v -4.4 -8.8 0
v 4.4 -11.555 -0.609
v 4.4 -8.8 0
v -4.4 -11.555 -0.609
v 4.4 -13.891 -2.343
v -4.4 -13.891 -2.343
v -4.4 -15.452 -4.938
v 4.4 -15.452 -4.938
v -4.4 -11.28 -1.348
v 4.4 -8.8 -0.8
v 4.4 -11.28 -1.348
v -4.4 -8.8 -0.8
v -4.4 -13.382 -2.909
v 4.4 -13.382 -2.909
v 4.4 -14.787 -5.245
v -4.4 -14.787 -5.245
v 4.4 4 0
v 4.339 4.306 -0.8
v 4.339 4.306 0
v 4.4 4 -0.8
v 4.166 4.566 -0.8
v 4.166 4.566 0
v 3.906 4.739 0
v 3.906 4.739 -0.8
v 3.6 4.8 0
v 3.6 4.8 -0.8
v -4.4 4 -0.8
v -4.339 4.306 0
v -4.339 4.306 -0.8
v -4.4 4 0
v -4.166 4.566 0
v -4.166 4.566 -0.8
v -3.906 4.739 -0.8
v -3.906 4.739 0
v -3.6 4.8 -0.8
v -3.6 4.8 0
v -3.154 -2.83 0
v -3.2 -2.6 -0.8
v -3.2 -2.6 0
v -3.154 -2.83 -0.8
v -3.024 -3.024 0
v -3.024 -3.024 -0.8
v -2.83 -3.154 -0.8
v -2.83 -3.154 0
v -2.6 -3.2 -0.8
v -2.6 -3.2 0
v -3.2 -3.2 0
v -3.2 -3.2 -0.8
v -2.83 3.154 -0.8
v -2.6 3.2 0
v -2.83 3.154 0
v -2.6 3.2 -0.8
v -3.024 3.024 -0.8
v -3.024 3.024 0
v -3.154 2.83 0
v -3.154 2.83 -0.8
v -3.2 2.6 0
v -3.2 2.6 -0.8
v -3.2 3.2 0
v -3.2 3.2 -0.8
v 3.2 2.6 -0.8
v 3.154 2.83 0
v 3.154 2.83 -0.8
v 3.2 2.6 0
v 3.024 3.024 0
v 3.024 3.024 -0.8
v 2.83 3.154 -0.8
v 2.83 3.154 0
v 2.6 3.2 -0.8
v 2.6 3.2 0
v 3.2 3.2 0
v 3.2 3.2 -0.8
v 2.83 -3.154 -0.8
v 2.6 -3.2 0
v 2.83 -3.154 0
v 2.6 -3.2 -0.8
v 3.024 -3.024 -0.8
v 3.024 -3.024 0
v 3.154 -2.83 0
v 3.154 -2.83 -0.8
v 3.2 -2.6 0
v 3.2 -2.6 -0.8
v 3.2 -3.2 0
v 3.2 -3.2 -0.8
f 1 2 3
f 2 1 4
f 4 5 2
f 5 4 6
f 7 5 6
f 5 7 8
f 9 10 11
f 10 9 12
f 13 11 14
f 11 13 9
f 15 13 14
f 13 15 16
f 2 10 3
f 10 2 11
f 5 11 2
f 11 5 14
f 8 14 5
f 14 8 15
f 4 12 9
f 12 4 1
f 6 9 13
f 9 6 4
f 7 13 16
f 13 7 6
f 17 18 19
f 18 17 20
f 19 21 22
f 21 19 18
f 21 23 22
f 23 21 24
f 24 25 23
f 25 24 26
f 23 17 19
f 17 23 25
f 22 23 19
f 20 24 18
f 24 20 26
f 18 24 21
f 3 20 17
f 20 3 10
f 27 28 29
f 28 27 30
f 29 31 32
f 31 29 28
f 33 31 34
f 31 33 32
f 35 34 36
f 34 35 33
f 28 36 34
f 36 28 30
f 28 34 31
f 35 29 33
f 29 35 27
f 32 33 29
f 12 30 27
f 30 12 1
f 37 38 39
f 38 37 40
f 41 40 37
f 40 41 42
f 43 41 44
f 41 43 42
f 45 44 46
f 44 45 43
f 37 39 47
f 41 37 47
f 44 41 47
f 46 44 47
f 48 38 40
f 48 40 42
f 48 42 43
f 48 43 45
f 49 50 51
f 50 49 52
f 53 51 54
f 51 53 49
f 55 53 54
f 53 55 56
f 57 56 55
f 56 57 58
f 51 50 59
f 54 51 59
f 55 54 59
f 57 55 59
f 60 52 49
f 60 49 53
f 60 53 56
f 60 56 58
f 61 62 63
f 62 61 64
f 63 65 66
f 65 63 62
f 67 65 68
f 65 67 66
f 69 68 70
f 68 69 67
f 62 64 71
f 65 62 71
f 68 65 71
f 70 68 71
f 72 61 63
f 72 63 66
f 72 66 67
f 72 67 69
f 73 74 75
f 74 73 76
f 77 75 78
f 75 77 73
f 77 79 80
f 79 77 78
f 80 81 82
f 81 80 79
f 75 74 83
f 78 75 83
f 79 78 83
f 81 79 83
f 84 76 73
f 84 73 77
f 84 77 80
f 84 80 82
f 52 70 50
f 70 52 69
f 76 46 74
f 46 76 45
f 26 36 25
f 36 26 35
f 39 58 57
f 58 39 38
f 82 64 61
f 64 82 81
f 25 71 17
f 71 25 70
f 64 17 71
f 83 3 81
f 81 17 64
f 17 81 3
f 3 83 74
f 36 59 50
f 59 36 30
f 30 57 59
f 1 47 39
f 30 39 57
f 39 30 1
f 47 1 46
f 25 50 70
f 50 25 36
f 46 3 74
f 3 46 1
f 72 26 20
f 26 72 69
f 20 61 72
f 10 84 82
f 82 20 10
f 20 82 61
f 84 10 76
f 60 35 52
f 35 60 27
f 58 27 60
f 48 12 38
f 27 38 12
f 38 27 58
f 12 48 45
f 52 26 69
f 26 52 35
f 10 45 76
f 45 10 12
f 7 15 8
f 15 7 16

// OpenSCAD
// file: ../p/4-4edge.scad
use <../lib.scad>
$fa=1; $fs=0.2;
function ldraw_lib__4_4edge(realsolid=false) = [
// 0 Circle 1.0
// 0 Name: 4-4edge.dat
// 0 Author: James Jessiman
// 0 !LDRAW_ORG Primitive UPDATE 2017-01
// 0 !LICENSE Licensed under CC BY 2.0 and CC BY 4.0 : see CAreadme.txt
// 
// 0 BFC CERTIFY CCW
  [0,"BFC","CERTIFY"],
  [0,"BFC","CCW"],
// 
// 0 !HISTORY 1998-12-15 [PTadmin] Official Update 1998-10
// 0 !HISTORY 2005-12-28 [PTadmin] Official Update 2005-01
// 0 !HISTORY 2007-06-24 [PTadmin] Header formatted for Contributor Agreement
// 0 !HISTORY 2008-07-01 [PTadmin] Official Update 2008-01
// 0 !HISTORY 2017-01-15 [Steffen] BFCed
// 0 !HISTORY 2017-12-30 [PTadmin] Official Update 2017-01
// 
// 
// 2 24 1 0 0 0.9239 0 0.3827
  [2,24,1,0,0,0.9239,0,0.3827],
// 2 24 0.9239 0 0.3827 0.7071 0 0.7071
  [2,24,0.9239,0,0.3827,0.7071,0,0.7071],
// 2 24 0.7071 0 0.7071 0.3827 0 0.9239
  [2,24,0.7071,0,0.7071,0.3827,0,0.9239],
// 2 24 0.3827 0 0.9239 0 0 1
  [2,24,0.3827,0,0.9239,0,0,1],
// 2 24 0 0 1 -0.3827 0 0.9239
  [2,24,0,0,1,-0.3827,0,0.9239],
// 2 24 -0.3827 0 0.9239 -0.7071 0 0.7071
  [2,24,-0.3827,0,0.9239,-0.7071,0,0.7071],
// 2 24 -0.7071 0 0.7071 -0.9239 0 0.3827
  [2,24,-0.7071,0,0.7071,-0.9239,0,0.3827],
// 2 24 -0.9239 0 0.3827 -1 0 -0
  [2,24,-0.9239,0,0.3827,-1,0,-0],
// 2 24 -1 0 -0 -0.9239 0 -0.3827
  [2,24,-1,0,-0,-0.9239,0,-0.3827],
// 2 24 -0.9239 0 -0.3827 -0.7071 0 -0.7071
  [2,24,-0.9239,0,-0.3827,-0.7071,0,-0.7071],
// 2 24 -0.7071 0 -0.7071 -0.3827 0 -0.9239
  [2,24,-0.7071,0,-0.7071,-0.3827,0,-0.9239],
// 2 24 -0.3827 0 -0.9239 0 0 -1
  [2,24,-0.3827,0,-0.9239,0,0,-1],
// 2 24 0 0 -1 0.3827 0 -0.9239
  [2,24,0,0,-1,0.3827,0,-0.9239],
// 2 24 0.3827 0 -0.9239 0.7071 0 -0.7071
  [2,24,0.3827,0,-0.9239,0.7071,0,-0.7071],
// 2 24 0.7071 0 -0.7071 0.9239 0 -0.3827
  [2,24,0.7071,0,-0.7071,0.9239,0,-0.3827],
// 2 24 0.9239 0 -0.3827 1 0 0
  [2,24,0.9239,0,-0.3827,1,0,0],
];
module ldraw_lib__4_4edge(step=0, col=false, unit=2/5, alt=false, line=0.2, solid=!$preview)
    makepoly(ldraw_lib__4_4edge(solid), step=step, col=col, unit=unit, alt=alt, line=line, solid=solid);
ldraw_lib__4_4edge(line=0.2);
// file: ../p/4-4disc.scad
use <../lib.scad>
$fa=1; $fs=0.2;
function ldraw_lib__4_4disc(realsolid=false) = [
// 0 Disc 1.0
// 0 Name: 4-4disc.dat
// 0 Author: James Jessiman
// 0 !LDRAW_ORG Primitive UPDATE 2002-02
// 0 !LICENSE Licensed under CC BY 2.0 and CC BY 4.0 : see CAreadme.txt
// 
// 0 BFC CERTIFY CCW
  [0,"BFC","CERTIFY"],
  [0,"BFC","CCW"],
// 
// 0 !HISTORY 1998-12-15 [PTadmin] Official Update 1998-10
// 0 !HISTORY 2002-03-23 [sbliss] Added BFC statement
// 0 !HISTORY 2002-04-25 [PTadmin] Official Update 2002-02
// 0 !HISTORY 2007-06-24 [PTadmin] Header formatted for Contributor Agreement
// 0 !HISTORY 2008-07-01 [PTadmin] Official Update 2008-01
// 
// 
// 3 16 0 0 0 1 0 0 0.9239 0 0.3827
  [3,16,0,0,0,1,0,0,0.9239,0,0.3827],
// 3 16 0 0 0 0.9239 0 0.3827 0.7071 0 0.7071
  [3,16,0,0,0,0.9239,0,0.3827,0.7071,0,0.7071],
// 3 16 0 0 0 0.7071 0 0.7071 0.3827 0 0.9239
  [3,16,0,0,0,0.7071,0,0.7071,0.3827,0,0.9239],
// 3 16 0 0 0 0.3827 0 0.9239 0 0 1
  [3,16,0,0,0,0.3827,0,0.9239,0,0,1],
// 3 16 0 0 0 0 0 1 -0.3827 0 0.9239
  [3,16,0,0,0,0,0,1,-0.3827,0,0.9239],
// 3 16 0 0 0 -0.3827 0 0.9239 -0.7071 0 0.7071
  [3,16,0,0,0,-0.3827,0,0.9239,-0.7071,0,0.7071],
// 3 16 0 0 0 -0.7071 0 0.7071 -0.9239 0 0.3827
  [3,16,0,0,0,-0.7071,0,0.7071,-0.9239,0,0.3827],
// 3 16 0 0 0 -0.9239 0 0.3827 -1 0 -0
  [3,16,0,0,0,-0.9239,0,0.3827,-1,0,-0],
// 3 16 0 0 0 -1 0 -0 -0.9239 0 -0.3827
  [3,16,0,0,0,-1,0,-0,-0.9239,0,-0.3827],
// 3 16 0 0 0 -0.9239 0 -0.3827 -0.7071 0 -0.7071
  [3,16,0,0,0,-0.9239,0,-0.3827,-0.7071,0,-0.7071],
// 3 16 0 0 0 -0.7071 0 -0.7071 -0.3827 0 -0.9239
  [3,16,0,0,0,-0.7071,0,-0.7071,-0.3827,0,-0.9239],
// 3 16 0 0 0 -0.3827 0 -0.9239 0 0 -1
  [3,16,0,0,0,-0.3827,0,-0.9239,0,0,-1],
// 3 16 0 0 0 0 0 -1 0.3827 0 -0.9239
  [3,16,0,0,0,0,0,-1,0.3827,0,-0.9239],
// 3 16 0 0 0 0.3827 0 -0.9239 0.7071 0 -0.7071
  [3,16,0,0,0,0.3827,0,-0.9239,0.7071,0,-0.7071],
// 3 16 0 0 0 0.7071 0 -0.7071 0.9239 0 -0.3827
  [3,16,0,0,0,0.7071,0,-0.7071,0.9239,0,-0.3827],
// 3 16 0 0 0 0.9239 0 -0.3827 1 0 0
  [3,16,0,0,0,0.9239,0,-0.3827,1,0,0],
// 0
];
module ldraw_lib__4_4disc(step=0, col=false, unit=2/5, alt=false, line=0.2, solid=!$preview)
    makepoly(ldraw_lib__4_4disc(solid), step=step, col=col, unit=unit, alt=alt, line=line, solid=solid);
ldraw_lib__4_4disc(line=0.2);
// file: ../p/4-4cyli.scad
use <../lib.scad>
$fa=1; $fs=0.2;
function ldraw_lib__4_4cyli(realsolid=false) = [
// 0 Cylinder 1.0
// 0 Name: 4-4cyli.dat
// 0 Author: James Jessiman
// 0 !LDRAW_ORG Primitive UPDATE 2005-01
// 0 !LICENSE Licensed under CC BY 2.0 and CC BY 4.0 : see CAreadme.txt
// 
// 0 BFC CERTIFY CCW
  [0,"BFC","CERTIFY"],
  [0,"BFC","CCW"],
// 
// 0 !HISTORY 1998-12-15 [PTadmin] Official Update 1998-10
// 0 !HISTORY 2002-03-23 [sbliss] Added BFC statement; merged headers from files in distributions LDraw 0.27 and Complete.
// 0 !HISTORY 2002-04-25 [PTadmin] Official Update 2002-02
// 0 !HISTORY 2004-12-14 [guyvivan] BFC CCW
// 0 !HISTORY 2005-12-28 [PTadmin] Official Update 2005-01
// 0 !HISTORY 2007-06-24 [PTadmin] Header formatted for Contributor Agreement
// 0 !HISTORY 2008-07-01 [PTadmin] Official Update 2008-01
// 
// 
// 4 16 1 1 0 0.9239 1 0.3827 0.9239 0 0.3827 1 0 0
  [4,16,1,1,0,0.9239,1,0.3827,0.9239,0,0.3827,1,0,0],
// 5 24 1 0 0 1 1 0 0.9239 0 0.3827 0.9239 0 -0.3827
  [5,24,1,0,0,1,1,0,0.9239,0,0.3827,0.9239,0,-0.3827],
// 4 16 0.9239 1 0.3827 0.7071 1 0.7071 0.7071 0 0.7071 0.9239 0 0.3827
  [4,16,0.9239,1,0.3827,0.7071,1,0.7071,0.7071,0,0.7071,0.9239,0,0.3827],
// 5 24 0.9239 0 0.3827 0.9239 1 0.3827 0.7071 0 0.7071 1 0 0
  [5,24,0.9239,0,0.3827,0.9239,1,0.3827,0.7071,0,0.7071,1,0,0],
// 4 16 0.7071 1 0.7071 0.3827 1 0.9239 0.3827 0 0.9239 0.7071 0 0.7071
  [4,16,0.7071,1,0.7071,0.3827,1,0.9239,0.3827,0,0.9239,0.7071,0,0.7071],
// 5 24 0.7071 0 0.7071 0.7071 1 0.7071 0.3827 0 0.9239 0.9239 0 0.3827
  [5,24,0.7071,0,0.7071,0.7071,1,0.7071,0.3827,0,0.9239,0.9239,0,0.3827],
// 4 16 0.3827 1 0.9239 0 1 1 0 0 1 0.3827 0 0.9239
  [4,16,0.3827,1,0.9239,0,1,1,0,0,1,0.3827,0,0.9239],
// 5 24 0.3827 0 0.9239 0.3827 1 0.9239 0 0 1 0.7071 0 0.7071
  [5,24,0.3827,0,0.9239,0.3827,1,0.9239,0,0,1,0.7071,0,0.7071],
// 4 16 0 1 1 -0.3827 1 0.9239 -0.3827 0 0.9239 0 0 1
  [4,16,0,1,1,-0.3827,1,0.9239,-0.3827,0,0.9239,0,0,1],
// 5 24 0 0 1 0 1 1 -0.3827 0 0.9239 0.3827 0 0.9239
  [5,24,0,0,1,0,1,1,-0.3827,0,0.9239,0.3827,0,0.9239],
// 4 16 -0.3827 1 0.9239 -0.7071 1 0.7071 -0.7071 0 0.7071 -0.3827 0 0.9239
  [4,16,-0.3827,1,0.9239,-0.7071,1,0.7071,-0.7071,0,0.7071,-0.3827,0,0.9239],
// 5 24 -0.3827 0 0.9239 -0.3827 1 0.9239 -0.7071 0 0.7071 0 0 1
  [5,24,-0.3827,0,0.9239,-0.3827,1,0.9239,-0.7071,0,0.7071,0,0,1],
// 4 16 -0.7071 1 0.7071 -0.9239 1 0.3827 -0.9239 0 0.3827 -0.7071 0 0.7071
  [4,16,-0.7071,1,0.7071,-0.9239,1,0.3827,-0.9239,0,0.3827,-0.7071,0,0.7071],
// 5 24 -0.7071 0 0.7071 -0.7071 1 0.7071 -0.9239 0 0.3827 -0.3827 0 0.9239
  [5,24,-0.7071,0,0.7071,-0.7071,1,0.7071,-0.9239,0,0.3827,-0.3827,0,0.9239],
// 4 16 -0.9239 1 0.3827 -1 1 0 -1 0 0 -0.9239 0 0.3827
  [4,16,-0.9239,1,0.3827,-1,1,0,-1,0,0,-0.9239,0,0.3827],
// 5 24 -0.9239 0 0.3827 -0.9239 1 0.3827 -1 0 0 -0.7071 0 0.7071
  [5,24,-0.9239,0,0.3827,-0.9239,1,0.3827,-1,0,0,-0.7071,0,0.7071],
// 4 16 -1 1 0 -0.9239 1 -0.3827 -0.9239 0 -0.3827 -1 0 0
  [4,16,-1,1,0,-0.9239,1,-0.3827,-0.9239,0,-0.3827,-1,0,0],
// 5 24 -1 0 0 -1 1 0 -0.9239 0 -0.3827 -0.9239 0 0.3827
  [5,24,-1,0,0,-1,1,0,-0.9239,0,-0.3827,-0.9239,0,0.3827],
// 4 16 -0.9239 1 -0.3827 -0.7071 1 -0.7071 -0.7071 0 -0.7071 -0.9239 0 -0.3827
  [4,16,-0.9239,1,-0.3827,-0.7071,1,-0.7071,-0.7071,0,-0.7071,-0.9239,0,-0.3827],
// 5 24 -0.9239 0 -0.3827 -0.9239 1 -0.3827 -0.7071 0 -0.7071 -1 0 0
  [5,24,-0.9239,0,-0.3827,-0.9239,1,-0.3827,-0.7071,0,-0.7071,-1,0,0],
// 4 16 -0.7071 1 -0.7071 -0.3827 1 -0.9239 -0.3827 0 -0.9239 -0.7071 0 -0.7071
  [4,16,-0.7071,1,-0.7071,-0.3827,1,-0.9239,-0.3827,0,-0.9239,-0.7071,0,-0.7071],
// 5 24 -0.7071 0 -0.7071 -0.7071 1 -0.7071 -0.3827 0 -0.9239 -0.9239 0 -0.3827
  [5,24,-0.7071,0,-0.7071,-0.7071,1,-0.7071,-0.3827,0,-0.9239,-0.9239,0,-0.3827],
// 4 16 -0.3827 1 -0.9239 0 1 -1 0 0 -1 -0.3827 0 -0.9239
  [4,16,-0.3827,1,-0.9239,0,1,-1,0,0,-1,-0.3827,0,-0.9239],
// 5 24 -0.3827 0 -0.9239 -0.3827 1 -0.9239 0 0 -1 -0.7071 0 -0.7071
  [5,24,-0.3827,0,-0.9239,-0.3827,1,-0.9239,0,0,-1,-0.7071,0,-0.7071],
// 4 16 0 1 -1 0.3827 1 -0.9239 0.3827 0 -0.9239 0 0 -1
  [4,16,0,1,-1,0.3827,1,-0.9239,0.3827,0,-0.9239,0,0,-1],
// 5 24 0 0 -1 0 1 -1 0.3827 0 -0.9239 -0.3827 0 -0.9239
  [5,24,0,0,-1,0,1,-1,0.3827,0,-0.9239,-0.3827,0,-0.9239],
// 4 16 0.3827 1 -0.9239 0.7071 1 -0.7071 0.7071 0 -0.7071 0.3827 0 -0.9239
  [4,16,0.3827,1,-0.9239,0.7071,1,-0.7071,0.7071,0,-0.7071,0.3827,0,-0.9239],
// 5 24 0.3827 0 -0.9239 0.3827 1 -0.9239 0.7071 0 -0.7071 0 0 -1
  [5,24,0.3827,0,-0.9239,0.3827,1,-0.9239,0.7071,0,-0.7071,0,0,-1],
// 4 16 0.7071 1 -0.7071 0.9239 1 -0.3827 0.9239 0 -0.3827 0.7071 0 -0.7071
  [4,16,0.7071,1,-0.7071,0.9239,1,-0.3827,0.9239,0,-0.3827,0.7071,0,-0.7071],
// 5 24 0.7071 0 -0.7071 0.7071 1 -0.7071 0.9239 0 -0.3827 0.3827 0 -0.9239
  [5,24,0.7071,0,-0.7071,0.7071,1,-0.7071,0.9239,0,-0.3827,0.3827,0,-0.9239],
// 4 16 0.9239 1 -0.3827 1 1 0 1 0 0 0.9239 0 -0.3827
  [4,16,0.9239,1,-0.3827,1,1,0,1,0,0,0.9239,0,-0.3827],
// 5 24 0.9239 0 -0.3827 0.9239 1 -0.3827 1 0 0 0.7071 0 -0.7071
  [5,24,0.9239,0,-0.3827,0.9239,1,-0.3827,1,0,0,0.7071,0,-0.7071],
// 0
];
module ldraw_lib__4_4cyli(step=0, col=false, unit=2/5, alt=false, line=0.2, solid=!$preview)
    makepoly(ldraw_lib__4_4cyli(solid), step=step, col=col, unit=unit, alt=alt, line=line, solid=solid);
ldraw_lib__4_4cyli(line=0.2);
// file: ../p/stud3.scad
use <../lib.scad>
use <4-4cyli.scad>
use <4-4disc.scad>
use <4-4edge.scad>
$fa=1; $fs=0.2;
function ldraw_lib__stud3(realsolid=false) = realsolid ? 
    [openscad(translate([0,0,-eps()], o=cylinder(4+eps(), r=4)),2)] : [
// 0 Stud Tube Solid
// 0 Name: stud3.dat
// 0 Author: James Jessiman
// 0 !LDRAW_ORG Primitive UPDATE 2012-01
// 0 !LICENSE Licensed under CC BY 2.0 and CC BY 4.0 : see CAreadme.txt
// 
// 0 BFC CERTIFY CCW
  [0,"BFC","CERTIFY"],
  [0,"BFC","CCW"],
// 
// 0 !HISTORY 2002-04-04 [sbliss] Modified for BFC compliance
// 0 !HISTORY 2002-04-25 [PTadmin] Official Update 2002-02
// 0 !HISTORY 2007-06-24 [PTadmin] Header formatted for Contributor Agreement
// 0 !HISTORY 2008-07-01 [PTadmin] Official Update 2008-01
// 0 !HISTORY 2012-02-16 [Philo] Changed to CCW
// 0 !HISTORY 2012-03-30 [PTadmin] Official Update 2012-01
// 
// 
// 1 16 0 -4 0 4 0 0 0 1 0 0 0 4 4-4edge.dat
  [1,16,0,-4,0,4,0,0,0,1,0,0,0,4, ldraw_lib__4_4edge(realsolid)],
// 1 16 0 0 0 4 0 0 0 1 0 0 0 4 4-4edge.dat
  [1,16,0,0,0,4,0,0,0,1,0,0,0,4, ldraw_lib__4_4edge(realsolid)],
// 1 16 0 -4 0 4 0 0 0 1 0 0 0 4 4-4disc.dat
  [1,16,0,-4,0,4,0,0,0,1,0,0,0,4, ldraw_lib__4_4disc(realsolid)],
// 1 16 0 -4 0 4 0 0 0 4 0 0 0 4 4-4cyli.dat
  [1,16,0,-4,0,4,0,0,0,4,0,0,0,4, ldraw_lib__4_4cyli(realsolid)],
];
module ldraw_lib__stud3(step=0, col=false, unit=2/5, alt=false, line=0.2, solid=!$preview)
    makepoly(ldraw_lib__stud3(solid), step=step, col=col, unit=unit, alt=alt, line=line, solid=solid);
ldraw_lib__stud3(line=0.2);
// file: ../p/stud.scad
use <../lib.scad>
use <4-4cyli.scad>
use <4-4disc.scad>
use <4-4edge.scad>
$fa=1; $fs=0.2;
function ldraw_lib__stud(realsolid=false) = realsolid ? 
    [openscad(translate([0,0,-eps()], o=cylinder(4+eps(), r=6)),2)] : [
// 0 Stud
// 0 Name: stud.dat
// 0 Author: James Jessiman
// 0 !LDRAW_ORG Primitive UPDATE 2012-01
// 0 !LICENSE Licensed under CC BY 2.0 and CC BY 4.0 : see CAreadme.txt
// 
// 0 BFC CERTIFY CCW
  [0,"BFC","CERTIFY"],
  [0,"BFC","CCW"],
// 
// 0 !HISTORY 2002-04-04 [sbliss] Modified for BFC compliance
// 0 !HISTORY 2002-04-25 [PTadmin] Official Update 2002-02
// 0 !HISTORY 2007-06-24 [PTadmin] Header formatted for Contributor Agreement
// 0 !HISTORY 2008-07-01 [PTadmin] Official Update 2008-01
// 0 !HISTORY 2012-02-16 [Philo] Changed to CCW
// 0 !HISTORY 2012-03-30 [PTadmin] Official Update 2012-01
// 
// 
// 1 16 0 0 0 6 0 0 0 1 0 0 0 6 4-4edge.dat
  [1,16,0,0,0,6,0,0,0,1,0,0,0,6, ldraw_lib__4_4edge(realsolid)],
// 1 16 0 -4 0 6 0 0 0 1 0 0 0 6 4-4edge.dat
  [1,16,0,-4,0,6,0,0,0,1,0,0,0,6, ldraw_lib__4_4edge(realsolid)],
// 1 16 0 0 0 6 0 0 0 -4 0 0 0 6 4-4cyli.dat
  [1,16,0,0,0,6,0,0,0,-4,0,0,0,6, ldraw_lib__4_4cyli(realsolid)],
// 1 16 0 -4 0 6 0 0 0 1 0 0 0 6 4-4disc.dat
  [1,16,0,-4,0,6,0,0,0,1,0,0,0,6, ldraw_lib__4_4disc(realsolid)],
];
module ldraw_lib__stud(step=0, col=false, unit=2/5, alt=false, line=0.2, solid=!$preview)
    makepoly(ldraw_lib__stud(solid), step=step, col=col, unit=unit, alt=alt, line=line, solid=solid);
ldraw_lib__stud(line=0.2);
// file: ../p/box5.scad
use <../lib.scad>
$fa=1; $fs=0.2;
function ldraw_lib__box5(realsolid=false) = [
// 0 Box with 5 Faces and All Edges
// 0 Name: box5.dat
// 0 Author: James Jessiman
// 0 !LDRAW_ORG Primitive UPDATE 2012-01
// 0 !LICENSE Licensed under CC BY 2.0 and CC BY 4.0 : see CAreadme.txt
// 
// 0 BFC CERTIFY CCW
  [0,"BFC","CERTIFY"],
  [0,"BFC","CCW"],
// 
// 0 !HISTORY 2002-04-03 [sbliss] Modified for BFC compliance
// 0 !HISTORY 2002-04-25 [PTadmin] Official Update 2002-02
// 0 !HISTORY 2007-06-24 [PTadmin] Header formatted for Contributor Agreement
// 0 !HISTORY 2008-07-01 [PTadmin] Official Update 2008-01
// 0 !HISTORY 2012-02-16 [Philo] Changed to CCW
// 0 !HISTORY 2012-03-30 [PTadmin] Official Update 2012-01
// 
// 
// 2 24 1 1 1 -1 1 1
  [2,24,1,1,1,-1,1,1],
// 2 24 -1 1 1 -1 1 -1
  [2,24,-1,1,1,-1,1,-1],
// 2 24 -1 1 -1 1 1 -1
  [2,24,-1,1,-1,1,1,-1],
// 2 24 1 1 -1 1 1 1
  [2,24,1,1,-1,1,1,1],
// 2 24 1 0 1 -1 0 1
  [2,24,1,0,1,-1,0,1],
// 2 24 -1 0 1 -1 0 -1
  [2,24,-1,0,1,-1,0,-1],
// 2 24 -1 0 -1 1 0 -1
  [2,24,-1,0,-1,1,0,-1],
// 2 24 1 0 -1 1 0 1
  [2,24,1,0,-1,1,0,1],
// 2 24 1 0 1 1 1 1
  [2,24,1,0,1,1,1,1],
// 2 24 -1 0 1 -1 1 1
  [2,24,-1,0,1,-1,1,1],
// 2 24 1 0 -1 1 1 -1
  [2,24,1,0,-1,1,1,-1],
// 2 24 -1 0 -1 -1 1 -1
  [2,24,-1,0,-1,-1,1,-1],
// 4 16 -1 1 1 1 1 1 1 1 -1 -1 1 -1
  [4,16,-1,1,1,1,1,1,1,1,-1,-1,1,-1],
// 4 16 -1 1 1 -1 0 1 1 0 1 1 1 1
  [4,16,-1,1,1,-1,0,1,1,0,1,1,1,1],
// 4 16 -1 1 -1 -1 0 -1 -1 0 1 -1 1 1
  [4,16,-1,1,-1,-1,0,-1,-1,0,1,-1,1,1],
// 4 16 1 1 -1 1 0 -1 -1 0 -1 -1 1 -1
  [4,16,1,1,-1,1,0,-1,-1,0,-1,-1,1,-1],
// 4 16 1 1 1 1 0 1 1 0 -1 1 1 -1
  [4,16,1,1,1,1,0,1,1,0,-1,1,1,-1],
];
module ldraw_lib__box5(step=0, col=false, unit=2/5, alt=false, line=0.2, solid=!$preview)
    makepoly(ldraw_lib__box5(solid), step=step, col=col, unit=unit, alt=alt, line=line, solid=solid);
ldraw_lib__box5(line=0.2);
// file: ../p/box4t.scad
use <../lib.scad>
$fa=1; $fs=0.2;
function ldraw_lib__box4t(realsolid=false) = [
// 0 Box with 4 Adjacent Faces and All Edges
// 0 Name: box4t.dat
// 0 Author: Tore Eriksson [Tore_Eriksson]
// 0 !LDRAW_ORG Primitive UPDATE 2003-02
// 0 !LICENSE Licensed under CC BY 2.0 and CC BY 4.0 : see CAreadme.txt
// 
// 0 BFC CERTIFY CCW
  [0,"BFC","CERTIFY"],
  [0,"BFC","CCW"],
// 
// 0 !HISTORY 1997-09-29 [PTadmin] Official Update 1997-15
// 0 !HISTORY 2002-08-31 [izanette] Modified with WINDZ for BFC compliance
// 0 !HISTORY 2003-08-01 [PTadmin] Official Update 2003-02
// 0 !HISTORY 2007-06-24 [PTadmin] Header formatted for Contributor Agreement
// 0 !HISTORY 2008-07-01 [PTadmin] Official Update 2008-01
// 
// 
// 2 24 1 1 1 -1 1 1
  [2,24,1,1,1,-1,1,1],
// 2 24 -1 1 1 -1 1 -1
  [2,24,-1,1,1,-1,1,-1],
// 2 24 -1 1 -1 1 1 -1
  [2,24,-1,1,-1,1,1,-1],
// 2 24 1 1 -1 1 1 1
  [2,24,1,1,-1,1,1,1],
// 2 24 1 0 1 -1 0 1
  [2,24,1,0,1,-1,0,1],
// 2 24 -1 0 1 -1 0 -1
  [2,24,-1,0,1,-1,0,-1],
// 2 24 -1 0 -1 1 0 -1
  [2,24,-1,0,-1,1,0,-1],
// 2 24 1 0 -1 1 0 1
  [2,24,1,0,-1,1,0,1],
// 2 24 1 0 1 1 1 1
  [2,24,1,0,1,1,1,1],
// 2 24 -1 0 1 -1 1 1
  [2,24,-1,0,1,-1,1,1],
// 2 24 1 0 -1 1 1 -1
  [2,24,1,0,-1,1,1,-1],
// 2 24 -1 0 -1 -1 1 -1
  [2,24,-1,0,-1,-1,1,-1],
// 4 16 1 1 1 1 1 -1 -1 1 -1 -1 1 1
  [4,16,1,1,1,1,1,-1,-1,1,-1,-1,1,1],
// 4 16 1 1 1 -1 1 1 -1 0 1 1 0 1
  [4,16,1,1,1,-1,1,1,-1,0,1,1,0,1],
// 4 16 -1 1 1 -1 1 -1 -1 0 -1 -1 0 1
  [4,16,-1,1,1,-1,1,-1,-1,0,-1,-1,0,1],
// 0 4 16 -1 1 -1 -1 0 -1 1 0 -1 1 1 -1
// 4 16 1 1 -1 1 1 1 1 0 1 1 0 -1
  [4,16,1,1,-1,1,1,1,1,0,1,1,0,-1],
// 0
];
module ldraw_lib__box4t(step=0, col=false, unit=2/5, alt=false, line=0.2, solid=!$preview)
    makepoly(ldraw_lib__box4t(solid), step=step, col=col, unit=unit, alt=alt, line=line, solid=solid);
ldraw_lib__box4t(line=0.2);
// file: s/3004s01.scad
use <../../lib.scad>
use <../../p/box4t.scad>
use <../../p/box5.scad>
use <../../p/stud.scad>
use <../../p/stud3.scad>
$fa=1; $fs=0.2;
function ldraw_lib__s__3004s01(realsolid=false) = [
// 0 ~Brick  1 x  2 without Front Face
// 0 Name: s\3004s01.dat
// 0 Author: James Jessiman
// 0 !LDRAW_ORG Subpart UPDATE 2003-03
// 0 !LICENSE Licensed under CC BY 2.0 and CC BY 4.0 : see CAreadme.txt
// 
// 0 BFC CERTIFY CCW
  [0,"BFC","CERTIFY"],
  [0,"BFC","CCW"],
// 
// 0 !HISTORY 2003-09-07 [jriley] Subfiling, BFC
// 0 !HISTORY 2003-12-19 [PTadmin] Official Update 2003-03
// 0 !HISTORY 2007-08-29 [PTadmin] Header formatted for Contributor Agreement
// 0 !HISTORY 2008-07-01 [PTadmin] Official Update 2008-01
// 
// 
// 1 16 0 4 0 1 0 0 0 -5 0 0 0 1 stud3.dat
  [1,16,0,4,0,1,0,0,0,-5,0,0,0,1, ldraw_lib__stud3(realsolid)],
// 0 BFC INVERTNEXT
  [0,"BFC","INVERTNEXT"],
// 1 16 0 24 0 16 0 0 0 -20 0 0 0 6 box5.dat
  [1,16,0,24,0,16,0,0,0,-20,0,0,0,6, ldraw_lib__box5(realsolid)],
// 4 16 20 24 10 16 24 6 -16 24 6 -20 24 10
  [4,16,20,24,10,16,24,6,-16,24,6,-20,24,10],
// 4 16 -20 24 10 -16 24 6 -16 24 -6 -20 24 -10
  [4,16,-20,24,10,-16,24,6,-16,24,-6,-20,24,-10],
// 4 16 -20 24 -10 -16 24 -6 16 24 -6 20 24 -10
  [4,16,-20,24,-10,-16,24,-6,16,24,-6,20,24,-10],
// 4 16 20 24 -10 16 24 -6 16 24 6 20 24 10
  [4,16,20,24,-10,16,24,-6,16,24,6,20,24,10],
// 1 16 0 24 0 20 0 0 0 -24 0 0 0 10 box4t.dat
  [1,16,0,24,0,20,0,0,0,-24,0,0,0,10, ldraw_lib__box4t(realsolid)],
// 1 16 10 0 0 1 0 0 0 1 0 0 0 1 stud.dat
  [1,16,10,0,0,1,0,0,0,1,0,0,0,1, ldraw_lib__stud(realsolid)],
// 1 16 -10 0 0 1 0 0 0 1 0 0 0 1 stud.dat
  [1,16,-10,0,0,1,0,0,0,1,0,0,0,1, ldraw_lib__stud(realsolid)],
// 0
];
module ldraw_lib__s__3004s01(step=0, col=false, unit=2/5, alt=false, line=0.2, solid=!$preview)
    makepoly(ldraw_lib__s__3004s01(solid), step=step, col=col, unit=unit, alt=alt, line=line, solid=solid);
ldraw_lib__s__3004s01(line=0.2);
// file: ../p/3-16edge.scad
use <../lib.scad>
$fa=1; $fs=0.2;
function ldraw_lib__3_16edge(realsolid=false) = [
// 0 Circle 0.1875
// 0 Name: 3-16edge.dat
// 0 Author: Donald Sutter [technog]
// 0 !LDRAW_ORG Primitive UPDATE 2017-01
// 0 !LICENSE Licensed under CC BY 2.0 and CC BY 4.0 : see CAreadme.txt
// 
// 0 BFC CERTIFY CCW
  [0,"BFC","CERTIFY"],
  [0,"BFC","CCW"],
// 
// 0 !HISTORY 2004-03-02 [PTadmin] Official Update 2004-01
// 0 !HISTORY 2007-06-24 [PTadmin] Header formatted for Contributor Agreement
// 0 !HISTORY 2008-07-01 [PTadmin] Official Update 2008-01
// 0 !HISTORY 2017-01-15 [Steffen] BFCed
// 0 !HISTORY 2017-12-30 [PTadmin] Official Update 2017-01
// 
// 
// 2 24 1 0 0 0.9239 0 0.3827
  [2,24,1,0,0,0.9239,0,0.3827],
// 2 24 0.9239 0 0.3827 0.7071 0 0.7071
  [2,24,0.9239,0,0.3827,0.7071,0,0.7071],
// 2 24 0.7071 0 0.7071 0.3827 0 0.9239
  [2,24,0.7071,0,0.7071,0.3827,0,0.9239],
];
module ldraw_lib__3_16edge(step=0, col=false, unit=2/5, alt=false, line=0.2, solid=!$preview)
    makepoly(ldraw_lib__3_16edge(solid), step=step, col=col, unit=unit, alt=alt, line=line, solid=solid);
ldraw_lib__3_16edge(line=0.2);
// file: ../p/3-16cyli.scad
use <../lib.scad>
$fa=1; $fs=0.2;
function ldraw_lib__3_16cyli(realsolid=false) = [
// 0 Cylinder 0.1875
// 0 Name: 3-16cyli.dat
// 0 Author: Mark Kennedy [mkennedy]
// 0 !LDRAW_ORG Primitive UPDATE 2005-01
// 0 !LICENSE Licensed under CC BY 2.0 and CC BY 4.0 : see CAreadme.txt
// 
// 0 BFC CERTIFY CCW
  [0,"BFC","CERTIFY"],
  [0,"BFC","CCW"],
// 
// 0 !HISTORY 2004-03-02 [PTadmin] Official Update 2004-01
// 0 !HISTORY 2004-12-11 [nielsk] Recreated using Primitive Generator, Edge lines fixed, BFC changed to CCW
// 0 !HISTORY 2005-12-28 [PTadmin] Official Update 2005-01
// 0 !HISTORY 2007-06-24 [PTadmin] Header formatted for Contributor Agreement
// 0 !HISTORY 2008-07-01 [PTadmin] Official Update 2008-01
// 
// 
// 4 16 .9239 1 .3827 .9239 0 .3827 1 0 0 1 1 0
  [4,16,.9239,1,.3827,.9239,0,.3827,1,0,0,1,1,0],
// 4 16 .7071 1 .7071 .7071 0 .7071 .9239 0 .3827 .9239 1 .3827
  [4,16,.7071,1,.7071,.7071,0,.7071,.9239,0,.3827,.9239,1,.3827],
// 4 16 .3827 1 .9239 .3827 0 .9239 .7071 0 .7071 .7071 1 .7071
  [4,16,.3827,1,.9239,.3827,0,.9239,.7071,0,.7071,.7071,1,.7071],
// 5 24 1 1 0 1 0 0 1 1 -.4142 .9239 1 .3827
  [5,24,1,1,0,1,0,0,1,1,-.4142,.9239,1,.3827],
// 5 24 .9239 1 .3827 .9239 0 .3827 1 1 0 .7071 1 .7071
  [5,24,.9239,1,.3827,.9239,0,.3827,1,1,0,.7071,1,.7071],
// 5 24 .7071 1 .7071 .7071 0 .7071 .9239 1 .3827 .3827 1 .9239
  [5,24,.7071,1,.7071,.7071,0,.7071,.9239,1,.3827,.3827,1,.9239],
// 5 24 .3827 1 .9239 .3827 0 .9239 .7071 1 .7071 0 1 1.0824
  [5,24,.3827,1,.9239,.3827,0,.9239,.7071,1,.7071,0,1,1.0824],
// 0
];
module ldraw_lib__3_16cyli(step=0, col=false, unit=2/5, alt=false, line=0.2, solid=!$preview)
    makepoly(ldraw_lib__3_16cyli(solid), step=step, col=col, unit=unit, alt=alt, line=line, solid=solid);
ldraw_lib__3_16cyli(line=0.2);
// file: ../p/1-4edge.scad
use <../lib.scad>
$fa=1; $fs=0.2;
function ldraw_lib__1_4edge(realsolid=false) = [
// 0 Circle 0.25
// 0 Name: 1-4edge.dat
// 0 Author: James Jessiman
// 0 !LDRAW_ORG Primitive UPDATE 2017-01
// 0 !LICENSE Licensed under CC BY 2.0 and CC BY 4.0 : see CAreadme.txt
// 
// 0 BFC CERTIFY CCW
  [0,"BFC","CERTIFY"],
  [0,"BFC","CCW"],
// 
// 0 !HISTORY 2007-06-22 [PTadmin] Header formatted for Contributor Agreement
// 0 !HISTORY 2008-07-01 [PTadmin] Official Update 2008-01
// 0 !HISTORY 2017-01-15 [Steffen] BFCed
// 0 !HISTORY 2017-12-30 [PTadmin] Official Update 2017-01
// 
// 
// 2 24 1 0 0 0.9239 0 0.3827
  [2,24,1,0,0,0.9239,0,0.3827],
// 2 24 0.9239 0 0.3827 0.7071 0 0.7071
  [2,24,0.9239,0,0.3827,0.7071,0,0.7071],
// 2 24 0.7071 0 0.7071 0.3827 0 0.9239
  [2,24,0.7071,0,0.7071,0.3827,0,0.9239],
// 2 24 0.3827 0 0.9239 0 0 1
  [2,24,0.3827,0,0.9239,0,0,1],
];
module ldraw_lib__1_4edge(step=0, col=false, unit=2/5, alt=false, line=0.2, solid=!$preview)
    makepoly(ldraw_lib__1_4edge(solid), step=step, col=col, unit=unit, alt=alt, line=line, solid=solid);
ldraw_lib__1_4edge(line=0.2);
// file: ../p/1-4cyli.scad
use <../lib.scad>
$fa=1; $fs=0.2;
function ldraw_lib__1_4cyli(realsolid=false) = [
// 0 Cylinder 0.25
// 0 Name: 1-4cyli.dat
// 0 Author: James Jessiman
// 0 !LDRAW_ORG Primitive UPDATE 2012-01
// 0 !LICENSE Licensed under CC BY 2.0 and CC BY 4.0 : see CAreadme.txt
// 
// 0 BFC CERTIFY CCW
  [0,"BFC","CERTIFY"],
  [0,"BFC","CCW"],
// 
// 0 !HISTORY 2002-03-23 [sbliss] Added BFC statement.
// 0 !HISTORY 2002-04-25 [PTadmin] Official Update 2002-02
// 0 !HISTORY 2007-06-22 [PTadmin] Header formatted for Contributor Agreement
// 0 !HISTORY 2008-07-01 [PTadmin] Official Update 2008-01
// 0 !HISTORY 2012-02-16 [Philo] Changed to CCW
// 0 !HISTORY 2012-03-30 [PTadmin] Official Update 2012-01
// 
// 
// 4 16 1 1 0 0.9239 1 0.3827 0.9239 0 0.3827 1 0 0
  [4,16,1,1,0,0.9239,1,0.3827,0.9239,0,0.3827,1,0,0],
// 5 24 1 0 0 1 1 0 0.9239 0 0.3827 1 0 -1
  [5,24,1,0,0,1,1,0,0.9239,0,0.3827,1,0,-1],
// 4 16 0.9239 1 0.3827 0.7071 1 0.7071 0.7071 0 0.7071 0.9239 0 0.3827
  [4,16,0.9239,1,0.3827,0.7071,1,0.7071,0.7071,0,0.7071,0.9239,0,0.3827],
// 5 24 0.9239 0 0.3827 0.9239 1 0.3827 0.7071 0 0.7071 1 0 0
  [5,24,0.9239,0,0.3827,0.9239,1,0.3827,0.7071,0,0.7071,1,0,0],
// 4 16 0.7071 1 0.7071 0.3827 1 0.9239 0.3827 0 0.9239 0.7071 0 0.7071
  [4,16,0.7071,1,0.7071,0.3827,1,0.9239,0.3827,0,0.9239,0.7071,0,0.7071],
// 5 24 0.7071 0 0.7071 0.7071 1 0.7071 0.3827 0 0.9239 0.9239 0 0.3827
  [5,24,0.7071,0,0.7071,0.7071,1,0.7071,0.3827,0,0.9239,0.9239,0,0.3827],
// 4 16 0.3827 1 0.9239 0 1 1 0 0 1 0.3827 0 0.9239
  [4,16,0.3827,1,0.9239,0,1,1,0,0,1,0.3827,0,0.9239],
// 5 24 0.3827 0 0.9239 0.3827 1 0.9239 0 0 1 0.7071 0 0.7071
  [5,24,0.3827,0,0.9239,0.3827,1,0.9239,0,0,1,0.7071,0,0.7071],
// 5 24 0 0 1 0 1 1 0.3827 0 0.9239 -1 0 1
  [5,24,0,0,1,0,1,1,0.3827,0,0.9239,-1,0,1],
];
module ldraw_lib__1_4cyli(step=0, col=false, unit=2/5, alt=false, line=0.2, solid=!$preview)
    makepoly(ldraw_lib__1_4cyli(solid), step=step, col=col, unit=unit, alt=alt, line=line, solid=solid);
ldraw_lib__1_4cyli(line=0.2);
// file: 3004.scad
use <../lib.scad>
use <s/3004s01.scad>
$fa=1; $fs=0.2;
function ldraw_lib__3004(realsolid=false) = [
// 0 Brick  1 x  2
// 0 Name: 3004.dat
// 0 Author: James Jessiman
// 0 !LDRAW_ORG Part UPDATE 2022-05
// 0 !LICENSE Licensed under CC BY 2.0 and CC BY 4.0 : see CAreadme.txt
// 
// 0 BFC CERTIFY CCW
  [0,"BFC","CERTIFY"],
  [0,"BFC","CCW"],
// 
// 0 !HISTORY 2001-10-26 [PTadmin] Official Update 2001-01
// 0 !HISTORY 2002-05-07 {unknown} BFC Certification
// 0 !HISTORY 2002-06-11 [PTadmin] Official Update 2002-03
// 0 !HISTORY 2007-05-07 [PTadmin] Header formatted for Contributor Agreement
// 0 !HISTORY 2008-07-01 [PTadmin] Official Update 2008-01
// 0 !HISTORY 2022-08-04 [MagFors] Using subfile
// 0 !HISTORY 2022-09-15 [PTadmin] Official Update 2022-05
// 
// 
// 1 16 0 0 0 1 0 0 0 1 0 0 0 1 s\3004s01.dat
  [1,16,0,0,0,1,0,0,0,1,0,0,0,1, ldraw_lib__s__3004s01(realsolid)],
// 4 16 -20 24 -10 20 24 -10 20 0 -10 -20 0 -10
  [4,16,-20,24,-10,20,24,-10,20,0,-10,-20,0,-10],
];
module ldraw_lib__3004(step=0, col=false, unit=2/5, alt=false, line=0.2, solid=!$preview)
    makepoly(ldraw_lib__3004(solid), step=step, col=col, unit=unit, alt=alt, line=line, solid=solid);
ldraw_lib__3004(line=0.2);
// file: ../p/3-16rin9.scad
use <../lib.scad>
$fa=1; $fs=0.2;
function ldraw_lib__3_16rin9(realsolid=false) = [
// 0 Ring  9 x 0.1875
// 0 Name: 3-16rin9.dat
// 0 Author: Guy Vivan [guyvivan]
// 0 !LDRAW_ORG Primitive UPDATE 2009-01
// 0 !LICENSE Licensed under CC BY 2.0 and CC BY 4.0 : see CAreadme.txt
// 
// 0 BFC CERTIFY CCW
  [0,"BFC","CERTIFY"],
  [0,"BFC","CCW"],
// 
// 0 !HISTORY 2009-05-02 [PTadmin] Official Update 2009-01
// 
// 
// 4 16 9 0 0 10 0 0 9.239 0 3.827 8.3151 0 3.4443
  [4,16,9,0,0,10,0,0,9.239,0,3.827,8.3151,0,3.4443],
// 4 16 8.3151 0 3.4443 9.239 0 3.827 7.071 0 7.071 6.3639 0 6.3639
  [4,16,8.3151,0,3.4443,9.239,0,3.827,7.071,0,7.071,6.3639,0,6.3639],
// 4 16 6.3639 0 6.3639 7.071 0 7.071 3.827 0 9.239 3.4443 0 8.3151
  [4,16,6.3639,0,6.3639,7.071,0,7.071,3.827,0,9.239,3.4443,0,8.3151],
// 
// 0 end of file
// 
];
module ldraw_lib__3_16rin9(step=0, col=false, unit=2/5, alt=false, line=0.2, solid=!$preview)
    makepoly(ldraw_lib__3_16rin9(solid), step=step, col=col, unit=unit, alt=alt, line=line, solid=solid);
ldraw_lib__3_16rin9(line=0.2);
// file: ../p/3-16cylo.scad
use <../lib.scad>
use <3-16cyli.scad>
use <3-16edge.scad>
$fa=1; $fs=0.2;
function ldraw_lib__3_16cylo(realsolid=false) = [
// 0 Cylinder Open 0.1875
// 0 Name: 3-16cylo.dat
// 0 Author: J.C. Tchang [tchang]
// 0 !LDRAW_ORG Primitive UPDATE 2013-01
// 0 !LICENSE Licensed under CC BY 2.0 and CC BY 4.0 : see CAreadme.txt
// 
// 0 BFC CERTIFY CCW
  [0,"BFC","CERTIFY"],
  [0,"BFC","CCW"],
// 
// 0 !HISTORY 2013-07-21 [PTadmin] Official Update 2013-01
// 
// 
// 1 16 0 0 0 1 0 0 0 1 0 0 0 1 3-16edge.dat
  [1,16,0,0,0,1,0,0,0,1,0,0,0,1, ldraw_lib__3_16edge(realsolid)],
// 1 16 0 1 0 1 0 0 0 1 0 0 0 1 3-16edge.dat
  [1,16,0,1,0,1,0,0,0,1,0,0,0,1, ldraw_lib__3_16edge(realsolid)],
// 1 16 0 0 0 1 0 0 0 1 0 0 0 1 3-16cyli.dat
  [1,16,0,0,0,1,0,0,0,1,0,0,0,1, ldraw_lib__3_16cyli(realsolid)],
];
module ldraw_lib__3_16cylo(step=0, col=false, unit=2/5, alt=false, line=0.2, solid=!$preview)
    makepoly(ldraw_lib__3_16cylo(solid), step=step, col=col, unit=unit, alt=alt, line=line, solid=solid);
ldraw_lib__3_16cylo(line=0.2);
// file: ../p/1-4ndis.scad
use <../lib.scad>
$fa=1; $fs=0.2;
function ldraw_lib__1_4ndis(realsolid=false) = [
// 0 Disc Negative 0.25
// 0 Name: 1-4ndis.dat
// 0 Author: James Jessiman
// 0 !LDRAW_ORG Primitive UPDATE 2012-01
// 0 !LICENSE Licensed under CC BY 2.0 and CC BY 4.0 : see CAreadme.txt
// 
// 0 BFC CERTIFY CCW
  [0,"BFC","CERTIFY"],
  [0,"BFC","CCW"],
// 
// 0 !HISTORY 2002-03-23 [sbliss] Added BFC Statement
// 0 !HISTORY 2002-04-25 [PTadmin] Official Update 2002-02
// 0 !HISTORY 2007-06-22 [PTadmin] Header formatted for Contributor Agreement
// 0 !HISTORY 2008-07-01 [PTadmin] Official Update 2008-01
// 0 !HISTORY 2012-02-16 [Philo] Changed to CCW
// 0 !HISTORY 2012-03-30 [PTadmin] Official Update 2012-01
// 
// 
// 3 16 0.9239 0 0.3827 1 0 0 1 0 1
  [3,16,0.9239,0,0.3827,1,0,0,1,0,1],
// 3 16 0.7071 0 0.7071 0.9239 0 0.3827 1 0 1
  [3,16,0.7071,0,0.7071,0.9239,0,0.3827,1,0,1],
// 3 16 0.3827 0 0.9239 0.7071 0 0.7071 1 0 1
  [3,16,0.3827,0,0.9239,0.7071,0,0.7071,1,0,1],
// 3 16 0 0 1 0.3827 0 0.9239 1 0 1
  [3,16,0,0,1,0.3827,0,0.9239,1,0,1],
];
module ldraw_lib__1_4ndis(step=0, col=false, unit=2/5, alt=false, line=0.2, solid=!$preview)
    makepoly(ldraw_lib__1_4ndis(solid), step=step, col=col, unit=unit, alt=alt, line=line, solid=solid);
ldraw_lib__1_4ndis(line=0.2);
// file: ../p/1-4cylo.scad
use <../lib.scad>
use <1-4cyli.scad>
use <1-4edge.scad>
$fa=1; $fs=0.2;
function ldraw_lib__1_4cylo(realsolid=false) = [
// 0 Cylinder Open 0.25
// 0 Name: 1-4cylo.dat
// 0 Author: Max Martin Richter [MMR1988]
// 0 !LDRAW_ORG Primitive UPDATE 2010-03
// 0 !LICENSE Licensed under CC BY 2.0 and CC BY 4.0 : see CAreadme.txt
// 
// 0 BFC CERTIFY CCW
  [0,"BFC","CERTIFY"],
  [0,"BFC","CCW"],
// 
// 0 !HISTORY 2010-12-31 [PTadmin] Official Update 2010-03
// 
// 
// 1 16 0 0 0 1 0 0 0 1 0 0 0 1 1-4edge.dat
  [1,16,0,0,0,1,0,0,0,1,0,0,0,1, ldraw_lib__1_4edge(realsolid)],
// 1 16 0 1 0 1 0 0 0 1 0 0 0 1 1-4edge.dat
  [1,16,0,1,0,1,0,0,0,1,0,0,0,1, ldraw_lib__1_4edge(realsolid)],
// 1 16 0 0 0 1 0 0 0 1 0 0 0 1 1-4cyli.dat
  [1,16,0,0,0,1,0,0,0,1,0,0,0,1, ldraw_lib__1_4cyli(realsolid)],
];
module ldraw_lib__1_4cylo(step=0, col=false, unit=2/5, alt=false, line=0.2, solid=!$preview)
    makepoly(ldraw_lib__1_4cylo(solid), step=step, col=col, unit=unit, alt=alt, line=line, solid=solid);
ldraw_lib__1_4cylo(line=0.2);
// file: ../p/1-4chrd.scad
use <../lib.scad>
$fa=1; $fs=0.2;
function ldraw_lib__1_4chrd(realsolid=false) = [
// 0 Chord 0.25
// 0 Name: 1-4chrd.dat
// 0 Author: Tony Hafner [hafhead]
// 0 !LDRAW_ORG Primitive UPDATE 2012-02
// 0 !LICENSE Licensed under CC BY 2.0 and CC BY 4.0 : see CAreadme.txt
// 
// 0 BFC CERTIFY CCW
  [0,"BFC","CERTIFY"],
  [0,"BFC","CCW"],
// 
// 0 !HISTORY 2004-04-22 [PTadmin] Official Update 2004-02
// 0 !HISTORY 2007-10-09 [PTadmin] Header formatted for Contributor Agreement
// 0 !HISTORY 2008-07-01 [PTadmin] Official Update 2008-01
// 0 !HISTORY 2012-08-02 [MMR1988] Re-creation with PrimGen2 and Rectifier
// 0 !HISTORY 2012-08-09 [PTadmin] Official Update 2012-02
// 
// 
// 4 16 0.9239 0 0.3827 0.3827 0 0.9239 0 0 1 1 0 0
  [4,16,0.9239,0,0.3827,0.3827,0,0.9239,0,0,1,1,0,0],
// 3 16 0.7071 0 0.7071 0.3827 0 0.9239 0.9239 0 0.3827
  [3,16,0.7071,0,0.7071,0.3827,0,0.9239,0.9239,0,0.3827],
];
module ldraw_lib__1_4chrd(step=0, col=false, unit=2/5, alt=false, line=0.2, solid=!$preview)
    makepoly(ldraw_lib__1_4chrd(solid), step=step, col=col, unit=unit, alt=alt, line=line, solid=solid);
ldraw_lib__1_4chrd(line=0.2);
// main file
use <../lib.scad>
use <../p/1-4chrd.scad>
use <../p/1-4cylo.scad>
use <../p/1-4ndis.scad>
use <../p/3-16cylo.scad>
use <../p/3-16rin9.scad>
$fa=1; $fs=0.2;
function ldraw_lib__22994(realsolid=false) = [
// 0 ~Electric Power Functions 2.0 Hub Diffusing Glass
// 0 Name: 22994.dat
// 0 Author: Philippe Hurbain [Philo]
// 0 !LDRAW_ORG Part UPDATE 2016-01
// 0 !LICENSE Licensed under CC BY 2.0 and CC BY 4.0 : see CAreadme.txt
// 
// 0 BFC CERTIFY CCW
  [0,"BFC","CERTIFY"],
  [0,"BFC","CCW"],
// 
// 0 !KEYWORDS WeDo 2.0
// 
// 0 !HISTORY 2016-12-31 [PTadmin] Official Update 2016-01
// 
// 
// 1 16 11 20 -22 0 -22 0 -20 0 0 0 0 -18 3-16cylo.dat
  [1,16,11,20,-22,0,-22,0,-20,0,0,0,0,-18, ldraw_lib__3_16cylo(realsolid)],
// 0 BFC INVERTNEXT
  [0,"BFC","INVERTNEXT"],
// 1 16 11 20 -22 0 -22 0 -18 0 0 0 0 -16.2 3-16cylo.dat
  [1,16,11,20,-22,0,-22,0,-18,0,0,0,0,-16.2, ldraw_lib__3_16cylo(realsolid)],
// 1 16 11 20 -22 0 -1 0 -2 0 0 0 0 -1.8 3-16rin9.dat
  [1,16,11,20,-22,0,-1,0,-2,0,0,0,0,-1.8, ldraw_lib__3_16rin9(realsolid)],
// 1 16 -11 20 -22 0 1 0 -2 0 0 0 0 -1.8 3-16rin9.dat
  [1,16,-11,20,-22,0,1,0,-2,0,0,0,0,-1.8, ldraw_lib__3_16rin9(realsolid)],
// 1 16 9 0 10 2 0 0 0 2 0 0 0 2 1-4cylo.dat
  [1,16,9,0,10,2,0,0,0,2,0,0,0,2, ldraw_lib__1_4cylo(realsolid)],
// 1 16 9 0 10 2 0 0 0 1 0 0 0 2 1-4chrd.dat
  [1,16,9,0,10,2,0,0,0,1,0,0,0,2, ldraw_lib__1_4chrd(realsolid)],
// 1 16 9 2 10 2 0 0 0 -1 0 0 0 2 1-4chrd.dat
  [1,16,9,2,10,2,0,0,0,-1,0,0,0,2, ldraw_lib__1_4chrd(realsolid)],
// 4 16 11 2 10 11 0 10 11 0 -22 11 2 -22
  [4,16,11,2,10,11,0,10,11,0,-22,11,2,-22],
// 2 24 11 0 10 11 0 -22
  [2,24,11,0,10,11,0,-22],
// 2 24 11 2 -22 11 2 10
  [2,24,11,2,-22,11,2,10],
// 1 16 -9 0 10 -2 0 0 0 2 0 0 0 2 1-4cylo.dat
  [1,16,-9,0,10,-2,0,0,0,2,0,0,0,2, ldraw_lib__1_4cylo(realsolid)],
// 1 16 -9 0 10 -2 0 0 0 1 0 0 0 2 1-4chrd.dat
  [1,16,-9,0,10,-2,0,0,0,1,0,0,0,2, ldraw_lib__1_4chrd(realsolid)],
// 1 16 -9 2 10 -2 0 0 0 -1 0 0 0 2 1-4chrd.dat
  [1,16,-9,2,10,-2,0,0,0,-1,0,0,0,2, ldraw_lib__1_4chrd(realsolid)],
// 4 16 -11 0 -22 -11 0 10 -11 2 10 -11 2 -22
  [4,16,-11,0,-22,-11,0,10,-11,2,10,-11,2,-22],
// 2 24 -11 0 10 -11 0 -22
  [2,24,-11,0,10,-11,0,-22],
// 2 24 -11 2 -22 -11 2 10
  [2,24,-11,2,-22,-11,2,10],
// 0 BFC INVERTNEXT
  [0,"BFC","INVERTNEXT"],
// 1 16 -6.5 0 -6.5 -1.5 0 0 0 2 0 0 0 -1.5 1-4cylo.dat
  [1,16,-6.5,0,-6.5,-1.5,0,0,0,2,0,0,0,-1.5, ldraw_lib__1_4cylo(realsolid)],
// 1 16 -6.5 0 -6.5 -1.5 0 0 0 1 0 0 0 -1.5 1-4ndis.dat
  [1,16,-6.5,0,-6.5,-1.5,0,0,0,1,0,0,0,-1.5, ldraw_lib__1_4ndis(realsolid)],
// 1 16 -6.5 2 -6.5 -1.5 0 0 0 -1 0 0 0 -1.5 1-4ndis.dat
  [1,16,-6.5,2,-6.5,-1.5,0,0,0,-1,0,0,0,-1.5, ldraw_lib__1_4ndis(realsolid)],
// 0 BFC INVERTNEXT
  [0,"BFC","INVERTNEXT"],
// 1 16 -6.5 0 6.5 0 0 -1.5 0 2 0 1.5 0 0 1-4cylo.dat
  [1,16,-6.5,0,6.5,0,0,-1.5,0,2,0,1.5,0,0, ldraw_lib__1_4cylo(realsolid)],
// 1 16 -6.5 0 6.5 0 0 -1.5 0 1 0 1.5 0 0 1-4ndis.dat
  [1,16,-6.5,0,6.5,0,0,-1.5,0,1,0,1.5,0,0, ldraw_lib__1_4ndis(realsolid)],
// 1 16 -6.5 2 6.5 0 0 -1.5 0 -1 0 1.5 0 0 1-4ndis.dat
  [1,16,-6.5,2,6.5,0,0,-1.5,0,-1,0,1.5,0,0, ldraw_lib__1_4ndis(realsolid)],
// 0 BFC INVERTNEXT
  [0,"BFC","INVERTNEXT"],
// 1 16 6.5 0 6.5 1.5 0 0 0 2 0 0 0 1.5 1-4cylo.dat
  [1,16,6.5,0,6.5,1.5,0,0,0,2,0,0,0,1.5, ldraw_lib__1_4cylo(realsolid)],
// 1 16 6.5 0 6.5 1.5 0 0 0 1 0 0 0 1.5 1-4ndis.dat
  [1,16,6.5,0,6.5,1.5,0,0,0,1,0,0,0,1.5, ldraw_lib__1_4ndis(realsolid)],
// 1 16 6.5 2 6.5 1.5 0 0 0 -1 0 0 0 1.5 1-4ndis.dat
  [1,16,6.5,2,6.5,1.5,0,0,0,-1,0,0,0,1.5, ldraw_lib__1_4ndis(realsolid)],
// 0 BFC INVERTNEXT
  [0,"BFC","INVERTNEXT"],
// 1 16 6.5 0 -6.5 0 0 1.5 0 2 0 -1.5 0 0 1-4cylo.dat
  [1,16,6.5,0,-6.5,0,0,1.5,0,2,0,-1.5,0,0, ldraw_lib__1_4cylo(realsolid)],
// 1 16 6.5 0 -6.5 0 0 1.5 0 1 0 -1.5 0 0 1-4ndis.dat
  [1,16,6.5,0,-6.5,0,0,1.5,0,1,0,-1.5,0,0, ldraw_lib__1_4ndis(realsolid)],
// 1 16 6.5 2 -6.5 0 0 1.5 0 -1 0 -1.5 0 0 1-4ndis.dat
  [1,16,6.5,2,-6.5,0,0,1.5,0,-1,0,-1.5,0,0, ldraw_lib__1_4ndis(realsolid)],
// 4 16 -6.5 0 8 -6.5 2 8 6.5 2 8 6.5 0 8
  [4,16,-6.5,0,8,-6.5,2,8,6.5,2,8,6.5,0,8],
// 2 24 -6.5 2 8 6.5 2 8
  [2,24,-6.5,2,8,6.5,2,8],
// 2 24 6.5 0 8 -6.5 0 8
  [2,24,6.5,0,8,-6.5,0,8],
// 2 24 -9 0 12 9 0 12
  [2,24,-9,0,12,9,0,12],
// 2 24 -9 2 12 9 2 12
  [2,24,-9,2,12,9,2,12],
// 2 24 -6.5 0 -8 6.5 0 -8
  [2,24,-6.5,0,-8,6.5,0,-8],
// 2 24 -6.5 2 -8 6.5 2 -8
  [2,24,-6.5,2,-8,6.5,2,-8],
// 4 16 -6.5 2 -8 -6.5 0 -8 6.5 0 -8 6.5 2 -8
  [4,16,-6.5,2,-8,-6.5,0,-8,6.5,0,-8,6.5,2,-8],
// 4 16 -9 2 12 -9 0 12 9 0 12 9 2 12
  [4,16,-9,2,12,-9,0,12,9,0,12,9,2,12],
// 4 16 -8 0 6.5 -8 0 -6.5 -8 2 -6.5 -8 2 6.5
  [4,16,-8,0,6.5,-8,0,-6.5,-8,2,-6.5,-8,2,6.5],
// 2 24 -8 0 -6.5 -8 0 6.5
  [2,24,-8,0,-6.5,-8,0,6.5],
// 2 24 -8 2 6.5 -8 2 -6.5
  [2,24,-8,2,6.5,-8,2,-6.5],
// 2 24 8 2 -6.5 8 2 6.5
  [2,24,8,2,-6.5,8,2,6.5],
// 2 24 8 0 6.5 8 0 -6.5
  [2,24,8,0,6.5,8,0,-6.5],
// 4 16 8 2 -6.5 8 0 -6.5 8 0 6.5 8 2 6.5
  [4,16,8,2,-6.5,8,0,-6.5,8,0,6.5,8,2,6.5],
// 4 16 9 0 12 6.5 0 8 8 0 8 11 0 10
  [4,16,9,0,12,6.5,0,8,8,0,8,11,0,10],
// 3 16 8 0 6.5 11 0 10 8 0 8
  [3,16,8,0,6.5,11,0,10,8,0,8],
// 3 16 8 0 -8 11 0 -22 8 0 -6.5
  [3,16,8,0,-8,11,0,-22,8,0,-6.5],
// 4 16 8 0 6.5 8 0 -6.5 11 0 -22 11 0 10
  [4,16,8,0,6.5,8,0,-6.5,11,0,-22,11,0,10],
// 3 16 11 0 -22 8 0 -8 6.5 0 -8
  [3,16,11,0,-22,8,0,-8,6.5,0,-8],
// 4 16 -8 0 8 -6.5 0 8 -9 0 12 -11 0 10
  [4,16,-8,0,8,-6.5,0,8,-9,0,12,-11,0,10],
// 3 16 -11 0 10 -8 0 6.5 -8 0 8
  [3,16,-11,0,10,-8,0,6.5,-8,0,8],
// 3 16 -11 0 -22 -8 0 -8 -8 0 -6.5
  [3,16,-11,0,-22,-8,0,-8,-8,0,-6.5],
// 4 16 -11 0 -22 -8 0 -6.5 -8 0 6.5 -11 0 10
  [4,16,-11,0,-22,-8,0,-6.5,-8,0,6.5,-11,0,10],
// 3 16 -8 0 -8 -11 0 -22 -6.5 0 -8
  [3,16,-8,0,-8,-11,0,-22,-6.5,0,-8],
// 4 16 9 0 12 -9 0 12 -6.5 0 8 6.5 0 8
  [4,16,9,0,12,-9,0,12,-6.5,0,8,6.5,0,8],
// 4 16 6.5 0 -8 -6.5 0 -8 -11 0 -22 11 0 -22
  [4,16,6.5,0,-8,-6.5,0,-8,-11,0,-22,11,0,-22],
// 4 16 8 2 8 6.5 2 8 9 2 12 11 2 10
  [4,16,8,2,8,6.5,2,8,9,2,12,11,2,10],
// 3 16 11 2 10 8 2 6.5 8 2 8
  [3,16,11,2,10,8,2,6.5,8,2,8],
// 3 16 11 2 -22 8 2 -8 8 2 -6.5
  [3,16,11,2,-22,8,2,-8,8,2,-6.5],
// 4 16 11 2 -22 8 2 -6.5 8 2 6.5 11 2 10
  [4,16,11,2,-22,8,2,-6.5,8,2,6.5,11,2,10],
// 3 16 8 2 -8 11 2 -22 6.5 2 -8
  [3,16,8,2,-8,11,2,-22,6.5,2,-8],
// 4 16 -9 2 12 -6.5 2 8 -8 2 8 -11 2 10
  [4,16,-9,2,12,-6.5,2,8,-8,2,8,-11,2,10],
// 3 16 -8 2 6.5 -11 2 10 -8 2 8
  [3,16,-8,2,6.5,-11,2,10,-8,2,8],
// 3 16 -8 2 -8 -11 2 -22 -8 2 -6.5
  [3,16,-8,2,-8,-11,2,-22,-8,2,-6.5],
// 4 16 -8 2 6.5 -8 2 -6.5 -11 2 -22 -11 2 10
  [4,16,-8,2,6.5,-8,2,-6.5,-11,2,-22,-11,2,10],
// 3 16 -11 2 -22 -8 2 -8 -6.5 2 -8
  [3,16,-11,2,-22,-8,2,-8,-6.5,2,-8],
// 4 16 -6.5 2 8 -9 2 12 9 2 12 6.5 2 8
  [4,16,-6.5,2,8,-9,2,12,9,2,12,6.5,2,8],
// 4 16 -11 2 -22 -6.5 2 -8 6.5 2 -8 11 2 -22
  [4,16,-11,2,-22,-6.5,2,-8,6.5,2,-8,11,2,-22],
// 4 16 11 13.1114 -36.9672 11 12.346 -38.6302 -11 12.346 -38.6302 -11 13.1114 -36.9672
  [4,16,11,13.1114,-36.9672,11,12.346,-38.6302,-11,12.346,-38.6302,-11,13.1114,-36.9672],
// 2 24 11 12.346 -38.6302 11 13.1114 -36.9672
  [2,24,11,12.346,-38.6302,11,13.1114,-36.9672],
// 2 24 -11 12.346 -38.6302 -11 13.1114 -36.9672
  [2,24,-11,12.346,-38.6302,-11,13.1114,-36.9672],
// 2 24 11 12.346 -38.6302 -11 12.346 -38.6302
  [2,24,11,12.346,-38.6302,-11,12.346,-38.6302],
// 2 24 11 13.1114 -36.9672 -11 13.1114 -36.9672
  [2,24,11,13.1114,-36.9672,-11,13.1114,-36.9672],
];
module ldraw_lib__22994(step=0, col=false, unit=2/5, alt=false, line=0.2, solid=!$preview)
    makepoly(ldraw_lib__22994(solid), step=step, col=col, unit=unit, alt=alt, line=line, solid=solid);
ldraw_lib__22994(line=0.2);
